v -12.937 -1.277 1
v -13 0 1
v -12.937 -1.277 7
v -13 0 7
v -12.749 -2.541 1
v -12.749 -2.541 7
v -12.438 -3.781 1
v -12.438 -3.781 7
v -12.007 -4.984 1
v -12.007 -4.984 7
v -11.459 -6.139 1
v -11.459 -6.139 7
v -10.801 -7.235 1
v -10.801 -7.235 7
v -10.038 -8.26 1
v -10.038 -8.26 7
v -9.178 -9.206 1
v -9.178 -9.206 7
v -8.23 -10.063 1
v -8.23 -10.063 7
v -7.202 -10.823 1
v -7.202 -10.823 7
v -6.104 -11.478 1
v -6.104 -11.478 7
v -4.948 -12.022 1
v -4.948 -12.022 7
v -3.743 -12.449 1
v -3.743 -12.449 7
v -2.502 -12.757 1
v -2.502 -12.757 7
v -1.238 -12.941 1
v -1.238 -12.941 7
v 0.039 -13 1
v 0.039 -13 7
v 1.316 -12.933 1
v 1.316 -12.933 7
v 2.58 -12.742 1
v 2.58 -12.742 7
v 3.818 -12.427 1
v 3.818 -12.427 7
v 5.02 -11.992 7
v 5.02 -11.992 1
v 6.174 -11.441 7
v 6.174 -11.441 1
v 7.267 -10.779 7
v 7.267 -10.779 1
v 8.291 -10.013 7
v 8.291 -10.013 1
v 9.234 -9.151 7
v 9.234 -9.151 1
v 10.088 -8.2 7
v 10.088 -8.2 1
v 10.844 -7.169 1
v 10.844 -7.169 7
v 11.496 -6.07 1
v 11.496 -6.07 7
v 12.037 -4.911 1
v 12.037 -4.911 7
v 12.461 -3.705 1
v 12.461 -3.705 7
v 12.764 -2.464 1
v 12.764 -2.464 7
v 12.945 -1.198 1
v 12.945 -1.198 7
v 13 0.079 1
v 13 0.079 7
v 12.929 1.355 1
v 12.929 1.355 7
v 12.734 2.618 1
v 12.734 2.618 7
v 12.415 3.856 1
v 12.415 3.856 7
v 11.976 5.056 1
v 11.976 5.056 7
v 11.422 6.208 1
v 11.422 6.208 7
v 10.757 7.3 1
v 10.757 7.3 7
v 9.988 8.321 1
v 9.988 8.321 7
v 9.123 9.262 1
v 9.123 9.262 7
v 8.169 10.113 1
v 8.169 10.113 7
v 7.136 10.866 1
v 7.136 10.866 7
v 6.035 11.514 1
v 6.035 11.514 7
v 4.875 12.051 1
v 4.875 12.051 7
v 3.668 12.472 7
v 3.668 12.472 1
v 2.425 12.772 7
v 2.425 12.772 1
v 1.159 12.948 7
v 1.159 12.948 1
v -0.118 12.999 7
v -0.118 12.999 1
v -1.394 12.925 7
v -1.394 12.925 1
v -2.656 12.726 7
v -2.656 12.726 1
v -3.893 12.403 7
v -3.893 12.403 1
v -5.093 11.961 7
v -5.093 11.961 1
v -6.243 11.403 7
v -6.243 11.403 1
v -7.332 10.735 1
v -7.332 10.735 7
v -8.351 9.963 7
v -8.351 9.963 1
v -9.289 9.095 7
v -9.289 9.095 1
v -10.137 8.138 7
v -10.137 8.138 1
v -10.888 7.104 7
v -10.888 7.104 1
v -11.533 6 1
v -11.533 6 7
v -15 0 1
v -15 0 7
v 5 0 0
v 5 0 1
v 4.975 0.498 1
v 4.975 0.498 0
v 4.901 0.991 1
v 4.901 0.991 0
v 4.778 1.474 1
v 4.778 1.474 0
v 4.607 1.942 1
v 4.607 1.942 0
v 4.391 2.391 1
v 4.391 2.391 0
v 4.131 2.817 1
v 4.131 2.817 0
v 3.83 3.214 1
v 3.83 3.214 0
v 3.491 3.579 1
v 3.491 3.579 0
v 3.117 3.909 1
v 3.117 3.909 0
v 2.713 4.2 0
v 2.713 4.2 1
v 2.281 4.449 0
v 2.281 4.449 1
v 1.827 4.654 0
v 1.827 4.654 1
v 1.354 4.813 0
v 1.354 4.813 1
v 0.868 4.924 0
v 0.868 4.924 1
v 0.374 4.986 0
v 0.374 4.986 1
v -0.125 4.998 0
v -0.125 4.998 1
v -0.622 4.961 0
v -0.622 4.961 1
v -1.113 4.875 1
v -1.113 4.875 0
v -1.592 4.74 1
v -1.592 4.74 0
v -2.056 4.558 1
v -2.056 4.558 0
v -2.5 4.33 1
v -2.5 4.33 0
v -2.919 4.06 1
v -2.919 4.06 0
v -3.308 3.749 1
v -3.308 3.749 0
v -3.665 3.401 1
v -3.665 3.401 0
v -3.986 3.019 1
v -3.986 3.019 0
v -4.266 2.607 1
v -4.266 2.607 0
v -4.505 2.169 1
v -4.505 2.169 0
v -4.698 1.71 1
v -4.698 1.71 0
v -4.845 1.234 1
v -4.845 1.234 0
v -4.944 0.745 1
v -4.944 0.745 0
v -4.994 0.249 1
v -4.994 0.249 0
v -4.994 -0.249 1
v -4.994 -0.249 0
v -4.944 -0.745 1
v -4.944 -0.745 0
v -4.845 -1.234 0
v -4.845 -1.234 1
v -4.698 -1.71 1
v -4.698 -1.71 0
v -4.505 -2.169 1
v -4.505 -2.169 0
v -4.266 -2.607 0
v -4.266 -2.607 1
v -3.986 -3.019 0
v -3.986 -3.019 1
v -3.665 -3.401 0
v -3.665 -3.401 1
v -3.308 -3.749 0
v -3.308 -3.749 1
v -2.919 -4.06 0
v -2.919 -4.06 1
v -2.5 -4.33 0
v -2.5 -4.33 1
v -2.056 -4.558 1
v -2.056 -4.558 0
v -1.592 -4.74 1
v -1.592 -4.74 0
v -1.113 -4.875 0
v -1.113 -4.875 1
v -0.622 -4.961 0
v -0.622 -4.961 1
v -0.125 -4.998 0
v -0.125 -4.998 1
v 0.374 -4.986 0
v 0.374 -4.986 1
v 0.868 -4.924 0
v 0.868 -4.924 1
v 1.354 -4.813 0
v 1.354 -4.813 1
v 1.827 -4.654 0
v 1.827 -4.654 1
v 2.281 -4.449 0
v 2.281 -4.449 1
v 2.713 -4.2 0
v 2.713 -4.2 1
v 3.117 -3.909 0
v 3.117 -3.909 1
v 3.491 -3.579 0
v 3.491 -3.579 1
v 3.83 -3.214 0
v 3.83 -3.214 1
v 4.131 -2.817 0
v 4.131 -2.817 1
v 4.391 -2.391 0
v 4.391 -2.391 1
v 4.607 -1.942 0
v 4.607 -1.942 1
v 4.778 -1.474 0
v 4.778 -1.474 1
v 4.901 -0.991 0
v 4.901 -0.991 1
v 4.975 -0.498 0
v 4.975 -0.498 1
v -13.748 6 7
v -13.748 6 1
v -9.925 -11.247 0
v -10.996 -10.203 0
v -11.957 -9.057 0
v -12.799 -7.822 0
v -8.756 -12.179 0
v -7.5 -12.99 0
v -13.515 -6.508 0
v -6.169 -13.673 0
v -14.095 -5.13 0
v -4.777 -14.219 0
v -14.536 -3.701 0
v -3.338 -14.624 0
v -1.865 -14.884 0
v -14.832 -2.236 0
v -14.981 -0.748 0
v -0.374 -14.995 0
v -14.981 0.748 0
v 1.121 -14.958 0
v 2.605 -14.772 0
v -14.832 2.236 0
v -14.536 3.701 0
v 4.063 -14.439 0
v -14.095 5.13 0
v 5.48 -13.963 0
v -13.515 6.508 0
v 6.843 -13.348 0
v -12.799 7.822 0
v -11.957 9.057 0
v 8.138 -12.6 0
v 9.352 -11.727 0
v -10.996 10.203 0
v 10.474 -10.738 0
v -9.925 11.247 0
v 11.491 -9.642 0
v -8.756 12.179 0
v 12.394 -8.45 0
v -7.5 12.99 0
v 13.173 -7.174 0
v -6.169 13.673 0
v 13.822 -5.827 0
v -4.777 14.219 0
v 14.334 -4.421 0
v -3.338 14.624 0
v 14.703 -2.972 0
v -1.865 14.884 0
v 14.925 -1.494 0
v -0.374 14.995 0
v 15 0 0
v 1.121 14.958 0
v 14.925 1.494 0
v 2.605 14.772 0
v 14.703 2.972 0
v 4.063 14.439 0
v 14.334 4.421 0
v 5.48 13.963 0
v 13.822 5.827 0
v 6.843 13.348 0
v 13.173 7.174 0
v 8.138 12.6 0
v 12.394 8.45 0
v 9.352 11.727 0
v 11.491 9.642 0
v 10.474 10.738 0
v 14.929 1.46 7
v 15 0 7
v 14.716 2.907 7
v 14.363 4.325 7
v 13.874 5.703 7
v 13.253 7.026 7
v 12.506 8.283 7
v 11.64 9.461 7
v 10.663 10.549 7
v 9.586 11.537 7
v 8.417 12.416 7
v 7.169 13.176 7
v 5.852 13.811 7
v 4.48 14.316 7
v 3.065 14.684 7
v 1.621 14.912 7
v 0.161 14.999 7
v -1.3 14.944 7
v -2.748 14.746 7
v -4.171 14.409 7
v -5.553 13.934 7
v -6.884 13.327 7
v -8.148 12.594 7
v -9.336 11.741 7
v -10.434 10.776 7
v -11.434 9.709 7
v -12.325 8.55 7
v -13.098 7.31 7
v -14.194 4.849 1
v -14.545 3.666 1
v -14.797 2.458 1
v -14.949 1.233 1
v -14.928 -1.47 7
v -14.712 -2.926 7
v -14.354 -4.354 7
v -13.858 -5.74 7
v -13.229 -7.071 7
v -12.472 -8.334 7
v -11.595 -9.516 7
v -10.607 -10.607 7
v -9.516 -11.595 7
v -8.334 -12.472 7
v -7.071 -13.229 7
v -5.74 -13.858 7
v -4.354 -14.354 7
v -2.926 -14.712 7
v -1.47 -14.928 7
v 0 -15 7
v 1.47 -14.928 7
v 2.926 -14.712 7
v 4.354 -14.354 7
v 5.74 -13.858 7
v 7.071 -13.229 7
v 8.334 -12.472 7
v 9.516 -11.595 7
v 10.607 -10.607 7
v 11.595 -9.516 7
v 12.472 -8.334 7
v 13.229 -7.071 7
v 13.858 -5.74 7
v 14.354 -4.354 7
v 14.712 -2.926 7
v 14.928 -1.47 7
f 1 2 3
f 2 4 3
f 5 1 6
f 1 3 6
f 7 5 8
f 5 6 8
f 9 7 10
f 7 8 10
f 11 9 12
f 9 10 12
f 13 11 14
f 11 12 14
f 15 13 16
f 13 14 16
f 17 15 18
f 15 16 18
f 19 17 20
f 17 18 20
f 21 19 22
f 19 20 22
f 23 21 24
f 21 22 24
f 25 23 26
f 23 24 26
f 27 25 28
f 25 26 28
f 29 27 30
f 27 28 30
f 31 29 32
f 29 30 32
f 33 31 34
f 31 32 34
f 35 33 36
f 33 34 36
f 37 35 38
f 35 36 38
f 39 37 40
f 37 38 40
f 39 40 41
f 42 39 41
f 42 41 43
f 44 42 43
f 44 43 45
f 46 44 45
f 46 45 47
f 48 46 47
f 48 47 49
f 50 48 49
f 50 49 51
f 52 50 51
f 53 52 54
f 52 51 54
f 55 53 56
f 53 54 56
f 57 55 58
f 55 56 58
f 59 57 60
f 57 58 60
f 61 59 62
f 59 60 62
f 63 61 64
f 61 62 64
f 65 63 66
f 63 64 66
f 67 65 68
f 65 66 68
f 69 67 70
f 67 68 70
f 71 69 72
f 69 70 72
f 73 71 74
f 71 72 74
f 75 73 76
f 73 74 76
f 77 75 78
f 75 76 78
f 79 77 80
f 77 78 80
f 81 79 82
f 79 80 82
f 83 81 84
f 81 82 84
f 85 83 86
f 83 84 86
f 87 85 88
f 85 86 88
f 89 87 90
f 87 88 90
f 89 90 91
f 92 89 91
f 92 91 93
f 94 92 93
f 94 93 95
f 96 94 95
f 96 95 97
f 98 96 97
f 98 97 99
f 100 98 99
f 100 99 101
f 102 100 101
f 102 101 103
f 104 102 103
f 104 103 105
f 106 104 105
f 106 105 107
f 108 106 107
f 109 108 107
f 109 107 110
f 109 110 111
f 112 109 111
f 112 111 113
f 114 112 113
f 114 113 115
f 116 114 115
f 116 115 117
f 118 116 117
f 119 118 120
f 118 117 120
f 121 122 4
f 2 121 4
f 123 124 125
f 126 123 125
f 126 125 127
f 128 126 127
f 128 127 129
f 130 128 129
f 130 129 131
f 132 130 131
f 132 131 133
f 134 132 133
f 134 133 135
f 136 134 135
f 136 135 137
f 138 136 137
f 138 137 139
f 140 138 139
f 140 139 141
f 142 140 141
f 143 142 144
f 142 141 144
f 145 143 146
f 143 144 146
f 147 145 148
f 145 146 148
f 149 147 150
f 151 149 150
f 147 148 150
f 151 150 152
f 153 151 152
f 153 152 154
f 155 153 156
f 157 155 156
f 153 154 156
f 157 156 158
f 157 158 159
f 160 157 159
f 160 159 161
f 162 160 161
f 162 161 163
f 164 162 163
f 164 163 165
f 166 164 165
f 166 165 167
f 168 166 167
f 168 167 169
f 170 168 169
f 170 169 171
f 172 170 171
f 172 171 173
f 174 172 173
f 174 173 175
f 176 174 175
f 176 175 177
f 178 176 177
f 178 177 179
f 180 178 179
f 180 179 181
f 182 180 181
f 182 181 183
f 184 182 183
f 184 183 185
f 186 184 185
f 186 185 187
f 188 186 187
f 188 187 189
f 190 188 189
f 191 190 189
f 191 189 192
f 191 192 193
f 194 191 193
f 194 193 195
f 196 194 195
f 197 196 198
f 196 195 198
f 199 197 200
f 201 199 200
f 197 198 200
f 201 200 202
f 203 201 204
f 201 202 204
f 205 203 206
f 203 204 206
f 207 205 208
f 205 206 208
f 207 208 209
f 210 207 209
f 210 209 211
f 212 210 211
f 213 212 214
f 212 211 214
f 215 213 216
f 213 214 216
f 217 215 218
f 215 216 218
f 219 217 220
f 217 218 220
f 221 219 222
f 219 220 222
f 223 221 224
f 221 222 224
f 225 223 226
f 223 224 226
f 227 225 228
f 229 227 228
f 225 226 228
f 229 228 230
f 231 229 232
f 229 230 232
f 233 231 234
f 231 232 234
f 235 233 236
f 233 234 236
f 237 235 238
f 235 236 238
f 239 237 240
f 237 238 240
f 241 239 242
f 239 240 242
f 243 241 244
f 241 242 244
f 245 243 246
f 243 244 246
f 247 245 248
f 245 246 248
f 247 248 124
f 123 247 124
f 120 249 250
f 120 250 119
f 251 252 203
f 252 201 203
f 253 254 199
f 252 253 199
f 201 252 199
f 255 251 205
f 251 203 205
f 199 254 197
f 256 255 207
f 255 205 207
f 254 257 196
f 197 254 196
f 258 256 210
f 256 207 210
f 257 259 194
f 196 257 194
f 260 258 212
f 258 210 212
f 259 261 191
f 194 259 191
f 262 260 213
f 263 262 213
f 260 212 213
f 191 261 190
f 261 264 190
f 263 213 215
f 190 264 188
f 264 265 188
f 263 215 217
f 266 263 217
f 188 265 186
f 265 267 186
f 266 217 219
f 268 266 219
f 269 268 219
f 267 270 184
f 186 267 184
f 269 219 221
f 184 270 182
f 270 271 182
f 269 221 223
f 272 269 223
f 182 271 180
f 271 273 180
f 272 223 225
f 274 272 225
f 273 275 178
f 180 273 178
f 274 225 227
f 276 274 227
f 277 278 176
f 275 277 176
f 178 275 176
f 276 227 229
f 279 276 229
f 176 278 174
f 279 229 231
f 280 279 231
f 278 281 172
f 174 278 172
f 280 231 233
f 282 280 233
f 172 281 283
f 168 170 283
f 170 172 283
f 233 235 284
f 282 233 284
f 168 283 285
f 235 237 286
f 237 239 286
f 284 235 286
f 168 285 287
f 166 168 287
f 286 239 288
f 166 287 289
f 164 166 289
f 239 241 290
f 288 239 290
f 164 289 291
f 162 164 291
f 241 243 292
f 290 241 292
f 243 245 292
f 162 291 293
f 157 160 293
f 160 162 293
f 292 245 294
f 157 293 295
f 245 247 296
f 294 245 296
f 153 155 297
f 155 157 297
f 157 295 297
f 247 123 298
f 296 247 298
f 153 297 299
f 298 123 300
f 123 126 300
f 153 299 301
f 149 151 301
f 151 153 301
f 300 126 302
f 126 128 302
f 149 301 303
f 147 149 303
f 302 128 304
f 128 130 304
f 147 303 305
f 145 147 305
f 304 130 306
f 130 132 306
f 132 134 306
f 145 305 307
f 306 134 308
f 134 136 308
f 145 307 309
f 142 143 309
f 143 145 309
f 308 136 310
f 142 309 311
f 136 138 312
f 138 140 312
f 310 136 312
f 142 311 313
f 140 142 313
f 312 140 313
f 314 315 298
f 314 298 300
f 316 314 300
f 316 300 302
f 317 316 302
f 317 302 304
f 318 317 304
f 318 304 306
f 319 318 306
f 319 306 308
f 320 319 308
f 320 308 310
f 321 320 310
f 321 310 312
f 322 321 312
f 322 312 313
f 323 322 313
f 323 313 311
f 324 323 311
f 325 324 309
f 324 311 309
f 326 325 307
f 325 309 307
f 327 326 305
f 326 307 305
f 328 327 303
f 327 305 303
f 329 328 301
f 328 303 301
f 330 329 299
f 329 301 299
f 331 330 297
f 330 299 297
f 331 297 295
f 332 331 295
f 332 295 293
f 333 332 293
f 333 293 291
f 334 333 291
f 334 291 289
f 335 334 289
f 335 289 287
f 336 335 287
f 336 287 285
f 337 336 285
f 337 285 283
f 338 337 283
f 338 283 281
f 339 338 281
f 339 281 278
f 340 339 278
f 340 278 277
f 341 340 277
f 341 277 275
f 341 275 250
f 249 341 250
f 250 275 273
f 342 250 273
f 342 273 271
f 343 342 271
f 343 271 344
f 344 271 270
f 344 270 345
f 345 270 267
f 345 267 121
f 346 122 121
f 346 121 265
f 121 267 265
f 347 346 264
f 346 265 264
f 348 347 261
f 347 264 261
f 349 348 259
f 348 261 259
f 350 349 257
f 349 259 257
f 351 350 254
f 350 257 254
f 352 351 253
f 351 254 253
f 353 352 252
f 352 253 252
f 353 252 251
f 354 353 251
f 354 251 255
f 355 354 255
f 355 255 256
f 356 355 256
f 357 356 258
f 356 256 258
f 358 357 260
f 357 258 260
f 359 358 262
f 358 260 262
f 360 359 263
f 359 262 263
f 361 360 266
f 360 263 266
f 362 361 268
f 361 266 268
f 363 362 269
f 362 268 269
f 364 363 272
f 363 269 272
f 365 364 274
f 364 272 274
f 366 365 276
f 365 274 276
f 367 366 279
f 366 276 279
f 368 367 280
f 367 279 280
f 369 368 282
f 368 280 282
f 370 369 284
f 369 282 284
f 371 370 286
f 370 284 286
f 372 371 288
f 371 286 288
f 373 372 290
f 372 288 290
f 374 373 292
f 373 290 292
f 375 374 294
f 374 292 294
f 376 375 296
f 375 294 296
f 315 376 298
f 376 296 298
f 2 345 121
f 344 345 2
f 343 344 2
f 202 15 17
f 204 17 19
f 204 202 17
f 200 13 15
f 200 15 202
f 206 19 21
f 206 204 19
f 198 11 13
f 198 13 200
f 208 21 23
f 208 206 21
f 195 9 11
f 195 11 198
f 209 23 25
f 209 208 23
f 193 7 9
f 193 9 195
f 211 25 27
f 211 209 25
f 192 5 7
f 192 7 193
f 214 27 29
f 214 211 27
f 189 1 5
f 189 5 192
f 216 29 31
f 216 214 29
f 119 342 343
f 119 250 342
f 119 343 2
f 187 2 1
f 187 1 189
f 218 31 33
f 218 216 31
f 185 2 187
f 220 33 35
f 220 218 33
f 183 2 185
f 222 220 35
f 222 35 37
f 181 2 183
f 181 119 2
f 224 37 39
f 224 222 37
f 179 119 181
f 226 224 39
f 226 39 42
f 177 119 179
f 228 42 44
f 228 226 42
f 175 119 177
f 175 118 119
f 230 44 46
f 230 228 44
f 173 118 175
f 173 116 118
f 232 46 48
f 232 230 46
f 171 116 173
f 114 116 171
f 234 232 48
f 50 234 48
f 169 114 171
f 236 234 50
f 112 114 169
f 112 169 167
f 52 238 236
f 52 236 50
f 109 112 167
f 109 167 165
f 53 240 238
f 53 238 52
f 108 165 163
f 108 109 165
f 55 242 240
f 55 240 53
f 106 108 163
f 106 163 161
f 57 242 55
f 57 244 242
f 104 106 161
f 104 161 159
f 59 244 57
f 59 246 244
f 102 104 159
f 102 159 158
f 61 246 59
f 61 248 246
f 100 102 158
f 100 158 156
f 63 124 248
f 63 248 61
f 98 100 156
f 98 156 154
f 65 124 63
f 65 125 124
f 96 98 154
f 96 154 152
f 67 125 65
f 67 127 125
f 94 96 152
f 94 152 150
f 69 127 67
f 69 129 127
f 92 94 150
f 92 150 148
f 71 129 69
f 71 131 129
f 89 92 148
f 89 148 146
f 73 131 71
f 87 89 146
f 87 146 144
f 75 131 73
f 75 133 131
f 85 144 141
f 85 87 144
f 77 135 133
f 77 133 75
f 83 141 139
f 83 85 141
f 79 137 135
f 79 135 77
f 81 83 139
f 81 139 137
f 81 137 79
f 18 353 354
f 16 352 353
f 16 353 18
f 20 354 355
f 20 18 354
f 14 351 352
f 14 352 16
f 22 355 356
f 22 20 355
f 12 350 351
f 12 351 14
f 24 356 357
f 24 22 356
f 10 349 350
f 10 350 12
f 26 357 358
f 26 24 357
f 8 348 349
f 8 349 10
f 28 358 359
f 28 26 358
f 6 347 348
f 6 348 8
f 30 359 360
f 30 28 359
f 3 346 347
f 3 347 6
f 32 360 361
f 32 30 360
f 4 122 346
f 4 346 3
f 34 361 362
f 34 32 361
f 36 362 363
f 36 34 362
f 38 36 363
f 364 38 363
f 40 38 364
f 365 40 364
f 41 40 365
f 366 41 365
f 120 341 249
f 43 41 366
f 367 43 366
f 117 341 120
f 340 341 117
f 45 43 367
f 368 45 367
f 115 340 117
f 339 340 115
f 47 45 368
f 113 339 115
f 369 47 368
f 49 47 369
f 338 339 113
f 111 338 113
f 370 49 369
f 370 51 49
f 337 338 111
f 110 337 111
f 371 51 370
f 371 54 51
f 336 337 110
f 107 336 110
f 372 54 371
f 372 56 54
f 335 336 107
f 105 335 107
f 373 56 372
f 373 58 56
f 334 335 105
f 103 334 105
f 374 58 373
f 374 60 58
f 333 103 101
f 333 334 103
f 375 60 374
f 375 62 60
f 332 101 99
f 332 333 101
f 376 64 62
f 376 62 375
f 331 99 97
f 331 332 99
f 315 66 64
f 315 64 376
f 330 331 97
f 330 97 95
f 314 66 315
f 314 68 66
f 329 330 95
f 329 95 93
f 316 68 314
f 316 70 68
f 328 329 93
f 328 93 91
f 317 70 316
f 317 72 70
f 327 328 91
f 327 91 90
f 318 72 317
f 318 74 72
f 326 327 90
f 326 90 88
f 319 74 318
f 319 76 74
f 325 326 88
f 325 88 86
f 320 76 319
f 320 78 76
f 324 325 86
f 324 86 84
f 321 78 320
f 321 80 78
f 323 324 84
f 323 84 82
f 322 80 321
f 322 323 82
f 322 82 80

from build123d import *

# Parameters (mm, degrees)
SKETCH_R        = 15
PAD_DEPTH       = 7
SKETCH001_R     = 13
POCKET_DEPTH    = 6
SKETCH002_W     = 4.722303
SKETCH002_H     = 6
POCKET001_DEPTH = 6
SKETCH003_R     = 5
POCKET002_DEPTH = 1.001


with BuildPart() as part:
    # Sketch → Pad (new body)
    with BuildSketch(Plane.XY):
        Circle(SKETCH_R)
    extrude(amount=PAD_DEPTH)

    # Sketch001 (on Face3 of Pad) → Pocket (cut)
    with BuildSketch(Plane.XY.offset(7)):
        Circle(SKETCH001_R)
    extrude(amount=-POCKET_DEPTH, mode=Mode.SUBTRACT)

    # Sketch002 (on Face3 of Pocket) → Pocket001 (cut)
    with BuildSketch(Plane.XY.offset(7)):
        with Locations((-13.693224, 3)):
            Rectangle(SKETCH002_W, SKETCH002_H)
    extrude(amount=-POCKET001_DEPTH, mode=Mode.SUBTRACT)

    # Sketch003 (on Face10 of Pocket001) → Pocket002 (cut, through all)
    with BuildSketch(Plane.XY.offset(1)):
        Circle(SKETCH003_R)
    extrude(amount=-POCKET002_DEPTH, mode=Mode.SUBTRACT)


solid = part.part
